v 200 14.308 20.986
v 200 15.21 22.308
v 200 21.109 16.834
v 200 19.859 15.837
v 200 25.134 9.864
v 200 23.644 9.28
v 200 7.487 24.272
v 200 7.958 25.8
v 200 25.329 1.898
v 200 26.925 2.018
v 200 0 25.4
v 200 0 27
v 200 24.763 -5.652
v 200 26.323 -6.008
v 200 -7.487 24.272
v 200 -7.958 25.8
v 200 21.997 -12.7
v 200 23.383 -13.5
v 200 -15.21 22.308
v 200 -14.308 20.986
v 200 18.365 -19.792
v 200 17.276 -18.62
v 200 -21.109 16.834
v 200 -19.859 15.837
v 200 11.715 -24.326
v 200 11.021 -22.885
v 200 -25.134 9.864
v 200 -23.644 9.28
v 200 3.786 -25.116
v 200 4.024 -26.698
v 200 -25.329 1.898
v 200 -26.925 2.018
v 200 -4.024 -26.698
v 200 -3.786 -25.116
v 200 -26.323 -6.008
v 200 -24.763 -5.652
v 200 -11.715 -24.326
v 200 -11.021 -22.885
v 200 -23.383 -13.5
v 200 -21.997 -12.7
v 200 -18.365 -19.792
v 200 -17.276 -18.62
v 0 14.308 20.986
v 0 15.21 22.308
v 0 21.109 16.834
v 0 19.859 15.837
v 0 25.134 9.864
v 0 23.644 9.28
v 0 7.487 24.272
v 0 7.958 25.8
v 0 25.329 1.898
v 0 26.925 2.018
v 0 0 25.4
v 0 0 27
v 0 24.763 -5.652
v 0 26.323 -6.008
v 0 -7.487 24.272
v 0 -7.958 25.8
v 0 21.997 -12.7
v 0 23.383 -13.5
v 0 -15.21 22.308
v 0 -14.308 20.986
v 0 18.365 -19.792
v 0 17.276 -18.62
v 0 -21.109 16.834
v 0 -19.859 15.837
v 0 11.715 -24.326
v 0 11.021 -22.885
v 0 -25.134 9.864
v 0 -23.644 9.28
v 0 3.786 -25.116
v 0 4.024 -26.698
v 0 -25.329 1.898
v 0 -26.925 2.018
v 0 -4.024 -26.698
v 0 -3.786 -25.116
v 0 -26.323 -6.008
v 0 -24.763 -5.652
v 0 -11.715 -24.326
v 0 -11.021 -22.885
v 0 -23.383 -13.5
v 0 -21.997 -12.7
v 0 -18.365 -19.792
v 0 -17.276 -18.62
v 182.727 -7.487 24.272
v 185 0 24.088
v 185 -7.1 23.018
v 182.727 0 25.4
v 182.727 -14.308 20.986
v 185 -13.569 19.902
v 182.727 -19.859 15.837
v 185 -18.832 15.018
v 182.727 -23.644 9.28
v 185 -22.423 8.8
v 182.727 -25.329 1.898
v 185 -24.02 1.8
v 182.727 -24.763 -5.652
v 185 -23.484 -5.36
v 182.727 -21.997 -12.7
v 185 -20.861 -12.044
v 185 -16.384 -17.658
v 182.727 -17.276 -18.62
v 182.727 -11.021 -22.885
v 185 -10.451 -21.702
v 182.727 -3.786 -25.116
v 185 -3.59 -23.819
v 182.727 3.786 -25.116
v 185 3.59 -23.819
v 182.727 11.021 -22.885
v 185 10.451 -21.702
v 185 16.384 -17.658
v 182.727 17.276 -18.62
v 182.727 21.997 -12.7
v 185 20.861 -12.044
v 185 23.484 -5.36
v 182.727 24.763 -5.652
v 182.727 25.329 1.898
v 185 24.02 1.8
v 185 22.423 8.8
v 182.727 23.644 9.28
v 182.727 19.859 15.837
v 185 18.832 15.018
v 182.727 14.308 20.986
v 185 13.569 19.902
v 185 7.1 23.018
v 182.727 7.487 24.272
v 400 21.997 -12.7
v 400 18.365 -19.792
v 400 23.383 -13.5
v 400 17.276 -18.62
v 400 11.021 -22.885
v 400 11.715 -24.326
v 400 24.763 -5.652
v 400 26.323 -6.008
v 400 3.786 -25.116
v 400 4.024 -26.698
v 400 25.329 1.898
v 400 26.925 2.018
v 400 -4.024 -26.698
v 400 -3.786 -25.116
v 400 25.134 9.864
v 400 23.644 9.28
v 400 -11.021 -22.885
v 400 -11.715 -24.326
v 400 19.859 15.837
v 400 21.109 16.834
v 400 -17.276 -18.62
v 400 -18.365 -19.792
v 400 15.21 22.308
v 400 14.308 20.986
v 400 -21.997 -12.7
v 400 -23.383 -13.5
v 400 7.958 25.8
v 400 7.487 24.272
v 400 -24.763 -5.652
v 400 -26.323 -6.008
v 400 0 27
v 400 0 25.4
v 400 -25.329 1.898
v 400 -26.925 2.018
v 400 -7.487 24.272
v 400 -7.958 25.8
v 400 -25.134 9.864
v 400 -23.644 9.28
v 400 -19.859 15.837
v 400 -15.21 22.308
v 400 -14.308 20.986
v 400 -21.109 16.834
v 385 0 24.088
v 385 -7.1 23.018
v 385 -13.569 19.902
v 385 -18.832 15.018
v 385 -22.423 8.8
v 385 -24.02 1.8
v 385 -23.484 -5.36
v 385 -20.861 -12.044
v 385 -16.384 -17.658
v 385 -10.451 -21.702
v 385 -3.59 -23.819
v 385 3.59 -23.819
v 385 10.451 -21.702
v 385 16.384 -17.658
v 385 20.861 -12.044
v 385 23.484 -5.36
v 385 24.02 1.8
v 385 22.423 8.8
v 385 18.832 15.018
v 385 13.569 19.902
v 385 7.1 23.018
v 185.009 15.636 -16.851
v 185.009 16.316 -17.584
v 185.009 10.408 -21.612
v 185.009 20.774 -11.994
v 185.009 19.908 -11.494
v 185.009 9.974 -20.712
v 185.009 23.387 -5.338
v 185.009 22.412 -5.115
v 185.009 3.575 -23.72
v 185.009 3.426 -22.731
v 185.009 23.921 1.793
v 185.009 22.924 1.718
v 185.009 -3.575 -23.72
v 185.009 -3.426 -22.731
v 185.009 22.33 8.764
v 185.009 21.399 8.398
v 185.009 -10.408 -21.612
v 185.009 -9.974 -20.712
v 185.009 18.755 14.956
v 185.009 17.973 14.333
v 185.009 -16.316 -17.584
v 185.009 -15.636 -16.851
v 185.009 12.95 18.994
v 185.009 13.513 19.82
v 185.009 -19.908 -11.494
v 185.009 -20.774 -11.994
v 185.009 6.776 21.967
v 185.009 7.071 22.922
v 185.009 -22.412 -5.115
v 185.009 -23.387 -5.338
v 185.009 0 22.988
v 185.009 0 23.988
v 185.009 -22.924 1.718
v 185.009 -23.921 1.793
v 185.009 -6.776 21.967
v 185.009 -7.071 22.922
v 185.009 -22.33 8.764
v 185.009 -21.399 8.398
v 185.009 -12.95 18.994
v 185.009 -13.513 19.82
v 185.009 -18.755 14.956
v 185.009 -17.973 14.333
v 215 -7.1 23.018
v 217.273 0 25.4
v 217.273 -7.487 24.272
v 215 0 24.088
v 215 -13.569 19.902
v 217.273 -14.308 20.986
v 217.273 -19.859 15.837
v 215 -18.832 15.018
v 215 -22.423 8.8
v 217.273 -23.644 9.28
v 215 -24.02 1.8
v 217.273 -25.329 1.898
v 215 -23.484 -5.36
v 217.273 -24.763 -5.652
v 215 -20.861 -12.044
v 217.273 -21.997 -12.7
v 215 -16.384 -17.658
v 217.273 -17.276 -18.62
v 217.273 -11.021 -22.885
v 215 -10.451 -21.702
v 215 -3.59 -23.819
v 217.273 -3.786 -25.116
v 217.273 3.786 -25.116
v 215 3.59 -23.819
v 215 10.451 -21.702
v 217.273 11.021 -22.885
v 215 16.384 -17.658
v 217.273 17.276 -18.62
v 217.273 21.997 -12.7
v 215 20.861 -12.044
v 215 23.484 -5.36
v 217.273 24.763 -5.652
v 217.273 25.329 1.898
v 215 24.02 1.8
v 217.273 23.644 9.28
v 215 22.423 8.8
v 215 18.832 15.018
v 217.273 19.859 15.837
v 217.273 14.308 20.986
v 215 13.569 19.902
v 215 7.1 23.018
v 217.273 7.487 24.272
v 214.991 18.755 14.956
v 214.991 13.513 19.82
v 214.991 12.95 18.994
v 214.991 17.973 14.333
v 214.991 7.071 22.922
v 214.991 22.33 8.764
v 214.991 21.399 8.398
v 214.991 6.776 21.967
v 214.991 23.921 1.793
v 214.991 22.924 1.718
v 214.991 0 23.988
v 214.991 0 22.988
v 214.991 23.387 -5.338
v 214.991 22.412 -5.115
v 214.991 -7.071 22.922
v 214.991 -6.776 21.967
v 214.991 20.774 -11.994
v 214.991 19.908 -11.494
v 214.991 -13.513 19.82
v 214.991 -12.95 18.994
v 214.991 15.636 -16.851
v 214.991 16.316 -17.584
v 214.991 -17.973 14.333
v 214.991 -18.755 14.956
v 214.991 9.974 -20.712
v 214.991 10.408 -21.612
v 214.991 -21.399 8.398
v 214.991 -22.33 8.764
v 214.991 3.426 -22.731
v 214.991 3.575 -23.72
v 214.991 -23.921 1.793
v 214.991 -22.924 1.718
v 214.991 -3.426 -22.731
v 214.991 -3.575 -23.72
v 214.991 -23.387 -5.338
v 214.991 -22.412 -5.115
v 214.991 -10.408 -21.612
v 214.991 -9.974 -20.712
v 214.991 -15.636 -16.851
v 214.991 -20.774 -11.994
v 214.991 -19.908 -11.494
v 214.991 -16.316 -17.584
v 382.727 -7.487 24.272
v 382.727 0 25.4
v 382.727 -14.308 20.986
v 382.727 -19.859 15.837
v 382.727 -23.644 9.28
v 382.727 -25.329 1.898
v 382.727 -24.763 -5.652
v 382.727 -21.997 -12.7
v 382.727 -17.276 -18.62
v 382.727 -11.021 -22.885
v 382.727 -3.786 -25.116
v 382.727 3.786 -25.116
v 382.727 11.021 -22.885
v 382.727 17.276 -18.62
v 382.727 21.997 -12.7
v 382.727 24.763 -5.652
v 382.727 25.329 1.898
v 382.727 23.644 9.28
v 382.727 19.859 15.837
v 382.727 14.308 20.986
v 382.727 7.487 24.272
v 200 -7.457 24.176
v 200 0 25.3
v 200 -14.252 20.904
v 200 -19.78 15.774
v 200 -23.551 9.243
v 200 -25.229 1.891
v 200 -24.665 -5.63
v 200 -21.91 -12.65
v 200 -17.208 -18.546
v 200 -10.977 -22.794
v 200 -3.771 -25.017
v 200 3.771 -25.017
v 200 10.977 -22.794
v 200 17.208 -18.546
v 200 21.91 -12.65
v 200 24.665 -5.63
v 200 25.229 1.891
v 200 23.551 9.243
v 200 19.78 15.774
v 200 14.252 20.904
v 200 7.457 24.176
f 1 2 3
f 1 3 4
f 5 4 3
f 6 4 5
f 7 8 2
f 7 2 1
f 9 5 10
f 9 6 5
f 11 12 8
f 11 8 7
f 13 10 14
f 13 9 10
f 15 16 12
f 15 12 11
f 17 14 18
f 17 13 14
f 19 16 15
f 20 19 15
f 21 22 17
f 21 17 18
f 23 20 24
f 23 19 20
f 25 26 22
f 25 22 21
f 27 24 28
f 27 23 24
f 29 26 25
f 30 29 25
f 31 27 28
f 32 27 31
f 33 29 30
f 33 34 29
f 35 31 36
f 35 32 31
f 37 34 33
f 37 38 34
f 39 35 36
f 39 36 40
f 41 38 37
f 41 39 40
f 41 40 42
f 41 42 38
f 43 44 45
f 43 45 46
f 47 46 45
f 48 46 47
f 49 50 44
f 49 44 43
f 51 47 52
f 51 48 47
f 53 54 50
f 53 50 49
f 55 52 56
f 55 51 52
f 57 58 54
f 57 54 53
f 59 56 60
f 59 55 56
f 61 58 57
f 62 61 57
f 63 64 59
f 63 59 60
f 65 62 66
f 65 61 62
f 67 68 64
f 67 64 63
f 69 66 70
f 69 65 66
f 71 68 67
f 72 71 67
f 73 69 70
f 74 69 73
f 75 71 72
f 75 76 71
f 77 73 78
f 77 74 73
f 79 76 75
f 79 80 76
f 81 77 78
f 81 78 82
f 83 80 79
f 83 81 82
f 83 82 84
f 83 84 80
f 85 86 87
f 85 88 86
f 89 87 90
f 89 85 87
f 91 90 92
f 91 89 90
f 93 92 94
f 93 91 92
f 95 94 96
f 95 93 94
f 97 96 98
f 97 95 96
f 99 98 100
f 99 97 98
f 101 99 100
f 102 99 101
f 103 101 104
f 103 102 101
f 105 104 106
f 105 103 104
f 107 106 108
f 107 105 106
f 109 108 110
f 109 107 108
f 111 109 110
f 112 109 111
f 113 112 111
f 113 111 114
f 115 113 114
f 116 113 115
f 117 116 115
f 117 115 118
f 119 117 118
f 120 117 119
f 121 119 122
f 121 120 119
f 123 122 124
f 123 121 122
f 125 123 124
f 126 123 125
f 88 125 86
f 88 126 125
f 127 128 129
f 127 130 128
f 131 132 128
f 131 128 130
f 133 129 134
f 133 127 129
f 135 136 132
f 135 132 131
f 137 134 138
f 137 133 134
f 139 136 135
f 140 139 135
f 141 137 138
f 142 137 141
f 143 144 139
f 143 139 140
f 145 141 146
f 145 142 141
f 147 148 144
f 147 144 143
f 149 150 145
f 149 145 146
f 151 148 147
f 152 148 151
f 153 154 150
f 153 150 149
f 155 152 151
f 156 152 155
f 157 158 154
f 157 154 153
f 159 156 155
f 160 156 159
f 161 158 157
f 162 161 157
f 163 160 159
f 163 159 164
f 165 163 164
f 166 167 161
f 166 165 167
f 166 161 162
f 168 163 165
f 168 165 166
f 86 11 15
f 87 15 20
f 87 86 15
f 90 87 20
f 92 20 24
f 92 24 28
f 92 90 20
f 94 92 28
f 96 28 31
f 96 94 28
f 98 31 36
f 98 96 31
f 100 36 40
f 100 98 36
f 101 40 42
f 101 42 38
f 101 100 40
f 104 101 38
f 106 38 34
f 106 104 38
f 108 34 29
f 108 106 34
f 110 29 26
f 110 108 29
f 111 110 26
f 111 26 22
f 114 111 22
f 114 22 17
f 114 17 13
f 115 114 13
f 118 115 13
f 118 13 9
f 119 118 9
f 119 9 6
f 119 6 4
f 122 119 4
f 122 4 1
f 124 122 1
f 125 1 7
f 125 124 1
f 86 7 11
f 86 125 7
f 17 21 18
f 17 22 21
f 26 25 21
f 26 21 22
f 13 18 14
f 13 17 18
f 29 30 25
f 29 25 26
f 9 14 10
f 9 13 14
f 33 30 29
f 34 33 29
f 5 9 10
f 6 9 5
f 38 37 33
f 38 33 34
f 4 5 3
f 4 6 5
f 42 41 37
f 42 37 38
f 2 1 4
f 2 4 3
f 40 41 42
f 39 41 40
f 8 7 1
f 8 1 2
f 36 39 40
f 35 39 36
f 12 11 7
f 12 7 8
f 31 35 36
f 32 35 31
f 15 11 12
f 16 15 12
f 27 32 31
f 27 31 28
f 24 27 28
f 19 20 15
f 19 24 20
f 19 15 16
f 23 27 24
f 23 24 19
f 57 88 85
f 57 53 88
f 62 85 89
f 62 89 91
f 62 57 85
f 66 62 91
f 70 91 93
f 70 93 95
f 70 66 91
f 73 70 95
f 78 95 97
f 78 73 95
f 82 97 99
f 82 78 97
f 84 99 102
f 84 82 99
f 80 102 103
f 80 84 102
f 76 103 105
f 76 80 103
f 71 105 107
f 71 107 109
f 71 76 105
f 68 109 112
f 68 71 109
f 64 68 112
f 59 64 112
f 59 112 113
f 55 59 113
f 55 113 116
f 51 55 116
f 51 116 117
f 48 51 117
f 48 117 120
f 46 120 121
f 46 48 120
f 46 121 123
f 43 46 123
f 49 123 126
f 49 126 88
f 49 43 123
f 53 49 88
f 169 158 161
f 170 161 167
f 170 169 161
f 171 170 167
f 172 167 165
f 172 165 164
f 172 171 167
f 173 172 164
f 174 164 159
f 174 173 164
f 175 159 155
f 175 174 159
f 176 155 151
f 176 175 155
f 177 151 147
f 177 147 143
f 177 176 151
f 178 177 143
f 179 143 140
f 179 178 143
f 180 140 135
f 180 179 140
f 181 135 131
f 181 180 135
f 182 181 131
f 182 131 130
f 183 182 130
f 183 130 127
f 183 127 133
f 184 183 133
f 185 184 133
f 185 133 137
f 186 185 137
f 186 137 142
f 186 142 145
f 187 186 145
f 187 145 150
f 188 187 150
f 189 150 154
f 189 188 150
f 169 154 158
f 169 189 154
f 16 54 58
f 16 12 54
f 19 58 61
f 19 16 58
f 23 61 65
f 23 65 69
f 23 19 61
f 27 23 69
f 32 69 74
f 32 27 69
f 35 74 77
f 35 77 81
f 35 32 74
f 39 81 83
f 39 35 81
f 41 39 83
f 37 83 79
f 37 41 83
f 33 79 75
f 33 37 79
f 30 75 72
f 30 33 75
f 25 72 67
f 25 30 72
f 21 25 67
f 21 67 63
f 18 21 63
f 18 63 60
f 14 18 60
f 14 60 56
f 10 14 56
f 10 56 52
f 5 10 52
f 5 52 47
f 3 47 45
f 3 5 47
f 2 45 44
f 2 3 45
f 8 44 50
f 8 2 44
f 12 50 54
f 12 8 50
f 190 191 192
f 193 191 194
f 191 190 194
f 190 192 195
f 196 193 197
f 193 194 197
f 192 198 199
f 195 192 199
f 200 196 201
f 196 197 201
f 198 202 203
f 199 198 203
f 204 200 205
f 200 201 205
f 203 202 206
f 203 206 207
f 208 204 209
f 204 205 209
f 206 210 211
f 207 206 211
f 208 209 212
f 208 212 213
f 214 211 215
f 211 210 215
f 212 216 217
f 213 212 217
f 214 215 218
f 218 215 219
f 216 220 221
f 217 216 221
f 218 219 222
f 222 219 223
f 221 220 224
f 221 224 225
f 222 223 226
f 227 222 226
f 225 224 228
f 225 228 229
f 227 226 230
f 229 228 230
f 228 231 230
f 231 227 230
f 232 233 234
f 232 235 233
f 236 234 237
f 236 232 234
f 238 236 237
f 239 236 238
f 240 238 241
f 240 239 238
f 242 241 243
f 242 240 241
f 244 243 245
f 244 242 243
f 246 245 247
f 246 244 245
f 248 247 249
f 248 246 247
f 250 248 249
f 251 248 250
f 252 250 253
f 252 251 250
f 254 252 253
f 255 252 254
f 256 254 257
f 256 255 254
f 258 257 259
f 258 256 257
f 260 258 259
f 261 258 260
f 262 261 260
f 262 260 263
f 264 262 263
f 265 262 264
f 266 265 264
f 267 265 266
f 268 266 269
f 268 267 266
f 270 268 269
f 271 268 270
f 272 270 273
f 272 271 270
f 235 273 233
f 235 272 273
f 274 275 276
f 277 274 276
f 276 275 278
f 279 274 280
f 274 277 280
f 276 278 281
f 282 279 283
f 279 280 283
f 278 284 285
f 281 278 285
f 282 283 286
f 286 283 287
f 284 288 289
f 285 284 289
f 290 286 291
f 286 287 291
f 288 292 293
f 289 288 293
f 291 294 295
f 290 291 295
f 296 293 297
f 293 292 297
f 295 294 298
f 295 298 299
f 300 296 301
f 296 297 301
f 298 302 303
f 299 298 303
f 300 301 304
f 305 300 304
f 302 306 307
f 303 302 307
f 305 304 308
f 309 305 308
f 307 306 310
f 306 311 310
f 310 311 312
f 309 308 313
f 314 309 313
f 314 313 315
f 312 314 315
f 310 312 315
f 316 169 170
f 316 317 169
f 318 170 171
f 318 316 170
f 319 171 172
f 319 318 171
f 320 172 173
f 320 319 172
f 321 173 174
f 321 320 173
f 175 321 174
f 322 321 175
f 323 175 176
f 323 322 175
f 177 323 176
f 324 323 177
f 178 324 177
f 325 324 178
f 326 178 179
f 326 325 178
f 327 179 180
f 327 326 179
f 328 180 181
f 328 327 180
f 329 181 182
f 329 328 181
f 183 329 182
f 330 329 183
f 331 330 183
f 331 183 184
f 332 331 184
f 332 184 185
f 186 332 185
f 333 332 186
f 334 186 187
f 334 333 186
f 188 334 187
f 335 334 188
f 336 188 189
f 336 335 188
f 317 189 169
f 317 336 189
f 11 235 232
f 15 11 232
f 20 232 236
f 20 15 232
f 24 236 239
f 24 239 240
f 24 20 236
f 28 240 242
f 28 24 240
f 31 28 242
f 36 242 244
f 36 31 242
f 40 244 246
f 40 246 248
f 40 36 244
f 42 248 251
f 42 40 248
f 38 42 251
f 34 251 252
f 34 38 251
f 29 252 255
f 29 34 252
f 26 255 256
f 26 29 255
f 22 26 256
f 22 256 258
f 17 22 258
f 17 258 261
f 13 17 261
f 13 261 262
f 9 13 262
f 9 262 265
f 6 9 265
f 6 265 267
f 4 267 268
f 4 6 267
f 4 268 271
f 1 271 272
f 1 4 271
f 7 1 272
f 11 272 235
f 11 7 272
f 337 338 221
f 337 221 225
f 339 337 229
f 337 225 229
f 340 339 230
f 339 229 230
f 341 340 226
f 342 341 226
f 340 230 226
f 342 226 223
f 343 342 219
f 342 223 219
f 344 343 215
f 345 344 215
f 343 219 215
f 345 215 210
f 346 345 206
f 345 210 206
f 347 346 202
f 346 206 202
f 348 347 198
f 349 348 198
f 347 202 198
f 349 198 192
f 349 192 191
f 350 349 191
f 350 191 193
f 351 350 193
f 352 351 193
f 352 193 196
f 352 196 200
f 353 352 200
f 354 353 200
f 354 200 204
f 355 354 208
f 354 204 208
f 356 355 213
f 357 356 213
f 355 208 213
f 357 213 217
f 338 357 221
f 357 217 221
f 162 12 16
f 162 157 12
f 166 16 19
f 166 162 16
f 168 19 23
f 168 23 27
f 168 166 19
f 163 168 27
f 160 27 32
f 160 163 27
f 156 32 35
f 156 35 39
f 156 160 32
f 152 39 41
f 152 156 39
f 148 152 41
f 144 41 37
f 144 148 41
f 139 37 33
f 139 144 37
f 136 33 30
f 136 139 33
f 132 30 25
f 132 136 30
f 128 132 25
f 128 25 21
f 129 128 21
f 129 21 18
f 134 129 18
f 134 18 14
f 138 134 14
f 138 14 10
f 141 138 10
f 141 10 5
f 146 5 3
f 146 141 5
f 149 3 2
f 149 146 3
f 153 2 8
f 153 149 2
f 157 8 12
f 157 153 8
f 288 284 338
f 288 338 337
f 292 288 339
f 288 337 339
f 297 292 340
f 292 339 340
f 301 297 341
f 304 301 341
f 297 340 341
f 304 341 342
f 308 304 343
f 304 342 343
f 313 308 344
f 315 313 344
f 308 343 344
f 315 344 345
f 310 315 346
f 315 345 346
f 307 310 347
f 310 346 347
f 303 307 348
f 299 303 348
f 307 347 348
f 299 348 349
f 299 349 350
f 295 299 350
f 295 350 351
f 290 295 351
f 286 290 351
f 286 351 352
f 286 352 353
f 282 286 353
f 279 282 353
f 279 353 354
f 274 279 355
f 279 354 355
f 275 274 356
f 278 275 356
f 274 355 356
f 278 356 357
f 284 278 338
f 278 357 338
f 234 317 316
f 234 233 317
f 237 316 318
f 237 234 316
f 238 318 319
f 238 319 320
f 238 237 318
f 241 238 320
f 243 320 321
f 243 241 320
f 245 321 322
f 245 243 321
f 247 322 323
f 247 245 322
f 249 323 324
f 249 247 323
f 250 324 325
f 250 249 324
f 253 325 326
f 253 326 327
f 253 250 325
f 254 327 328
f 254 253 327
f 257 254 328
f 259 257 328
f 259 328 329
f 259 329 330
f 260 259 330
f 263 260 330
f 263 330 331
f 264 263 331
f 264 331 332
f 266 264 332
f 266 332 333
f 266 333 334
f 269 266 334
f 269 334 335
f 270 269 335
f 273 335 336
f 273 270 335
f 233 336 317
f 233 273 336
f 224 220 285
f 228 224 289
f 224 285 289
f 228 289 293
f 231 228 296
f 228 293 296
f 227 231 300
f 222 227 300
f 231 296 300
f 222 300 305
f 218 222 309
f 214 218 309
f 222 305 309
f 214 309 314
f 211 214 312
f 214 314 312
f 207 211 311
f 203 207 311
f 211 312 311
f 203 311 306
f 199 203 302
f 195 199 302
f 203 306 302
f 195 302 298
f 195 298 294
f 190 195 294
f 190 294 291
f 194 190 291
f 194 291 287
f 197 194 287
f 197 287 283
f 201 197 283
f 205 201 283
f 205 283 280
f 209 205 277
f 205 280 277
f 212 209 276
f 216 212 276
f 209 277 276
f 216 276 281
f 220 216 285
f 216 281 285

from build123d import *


with BuildPart() as part:
    # Sketch1 → Revolve1 (revolve)
    with BuildSketch(Plane(origin=(0, 0, 0), x_dir=(1, 0, 0), z_dir=(0, 1, 0)), mode=Mode.PRIVATE) as revolve1_sk:
        Polygon((185, 24.087670047), (182.726977845, 25.4), (0, 25.4), (0, 27), (200, 27), (200, 25.4), align=None)
    revolve(revolve1_sk.sketch.rotate(Axis((0, 0, 0), (1, 0, 0)), 180), axis=Axis((0, 0, 0), (1, 0, 0)))


with BuildPart() as body_2:
    # Sketch2 → Revolve2 (revolve)
    with BuildSketch(Plane(origin=(0, 0, 0), x_dir=(1, 0, 0), z_dir=(0, 1, 0)), mode=Mode.PRIVATE) as revolve2_sk:
        Polygon((382.726977845, 25.4), (217.273022155, 25.4), (215, 24.087670047), (200, 25.4), (200, 27), (400, 27), (400, 25.4), (385, 24.087670047), align=None)
    revolve(revolve2_sk.sketch.rotate(Axis((0, 0, 0), (1, 0, 0)), 180), axis=Axis((0, 0, 0), (1, 0, 0)))


with BuildPart() as body_3:
    # Sketch4 → Revolve3 (revolve)
    with BuildSketch(Plane(origin=(0, 0, 0), x_dir=(1, 0, 0), z_dir=(0, 1, 0)), mode=Mode.PRIVATE) as revolve3_sk:
        Polygon((200, 25.299618016), (185.008715574, 23.988050577), (185.008715574, 22.988050577), (214.991284426, 22.988050577), (214.991284426, 23.988050577), align=None)
    revolve(revolve3_sk.sketch.rotate(Axis((0, 0, 0), (1, 0, 0)), 180), axis=Axis((0, 0, 0), (1, 0, 0)))


solid = Compound([part.part, body_2.part, body_3.part])
